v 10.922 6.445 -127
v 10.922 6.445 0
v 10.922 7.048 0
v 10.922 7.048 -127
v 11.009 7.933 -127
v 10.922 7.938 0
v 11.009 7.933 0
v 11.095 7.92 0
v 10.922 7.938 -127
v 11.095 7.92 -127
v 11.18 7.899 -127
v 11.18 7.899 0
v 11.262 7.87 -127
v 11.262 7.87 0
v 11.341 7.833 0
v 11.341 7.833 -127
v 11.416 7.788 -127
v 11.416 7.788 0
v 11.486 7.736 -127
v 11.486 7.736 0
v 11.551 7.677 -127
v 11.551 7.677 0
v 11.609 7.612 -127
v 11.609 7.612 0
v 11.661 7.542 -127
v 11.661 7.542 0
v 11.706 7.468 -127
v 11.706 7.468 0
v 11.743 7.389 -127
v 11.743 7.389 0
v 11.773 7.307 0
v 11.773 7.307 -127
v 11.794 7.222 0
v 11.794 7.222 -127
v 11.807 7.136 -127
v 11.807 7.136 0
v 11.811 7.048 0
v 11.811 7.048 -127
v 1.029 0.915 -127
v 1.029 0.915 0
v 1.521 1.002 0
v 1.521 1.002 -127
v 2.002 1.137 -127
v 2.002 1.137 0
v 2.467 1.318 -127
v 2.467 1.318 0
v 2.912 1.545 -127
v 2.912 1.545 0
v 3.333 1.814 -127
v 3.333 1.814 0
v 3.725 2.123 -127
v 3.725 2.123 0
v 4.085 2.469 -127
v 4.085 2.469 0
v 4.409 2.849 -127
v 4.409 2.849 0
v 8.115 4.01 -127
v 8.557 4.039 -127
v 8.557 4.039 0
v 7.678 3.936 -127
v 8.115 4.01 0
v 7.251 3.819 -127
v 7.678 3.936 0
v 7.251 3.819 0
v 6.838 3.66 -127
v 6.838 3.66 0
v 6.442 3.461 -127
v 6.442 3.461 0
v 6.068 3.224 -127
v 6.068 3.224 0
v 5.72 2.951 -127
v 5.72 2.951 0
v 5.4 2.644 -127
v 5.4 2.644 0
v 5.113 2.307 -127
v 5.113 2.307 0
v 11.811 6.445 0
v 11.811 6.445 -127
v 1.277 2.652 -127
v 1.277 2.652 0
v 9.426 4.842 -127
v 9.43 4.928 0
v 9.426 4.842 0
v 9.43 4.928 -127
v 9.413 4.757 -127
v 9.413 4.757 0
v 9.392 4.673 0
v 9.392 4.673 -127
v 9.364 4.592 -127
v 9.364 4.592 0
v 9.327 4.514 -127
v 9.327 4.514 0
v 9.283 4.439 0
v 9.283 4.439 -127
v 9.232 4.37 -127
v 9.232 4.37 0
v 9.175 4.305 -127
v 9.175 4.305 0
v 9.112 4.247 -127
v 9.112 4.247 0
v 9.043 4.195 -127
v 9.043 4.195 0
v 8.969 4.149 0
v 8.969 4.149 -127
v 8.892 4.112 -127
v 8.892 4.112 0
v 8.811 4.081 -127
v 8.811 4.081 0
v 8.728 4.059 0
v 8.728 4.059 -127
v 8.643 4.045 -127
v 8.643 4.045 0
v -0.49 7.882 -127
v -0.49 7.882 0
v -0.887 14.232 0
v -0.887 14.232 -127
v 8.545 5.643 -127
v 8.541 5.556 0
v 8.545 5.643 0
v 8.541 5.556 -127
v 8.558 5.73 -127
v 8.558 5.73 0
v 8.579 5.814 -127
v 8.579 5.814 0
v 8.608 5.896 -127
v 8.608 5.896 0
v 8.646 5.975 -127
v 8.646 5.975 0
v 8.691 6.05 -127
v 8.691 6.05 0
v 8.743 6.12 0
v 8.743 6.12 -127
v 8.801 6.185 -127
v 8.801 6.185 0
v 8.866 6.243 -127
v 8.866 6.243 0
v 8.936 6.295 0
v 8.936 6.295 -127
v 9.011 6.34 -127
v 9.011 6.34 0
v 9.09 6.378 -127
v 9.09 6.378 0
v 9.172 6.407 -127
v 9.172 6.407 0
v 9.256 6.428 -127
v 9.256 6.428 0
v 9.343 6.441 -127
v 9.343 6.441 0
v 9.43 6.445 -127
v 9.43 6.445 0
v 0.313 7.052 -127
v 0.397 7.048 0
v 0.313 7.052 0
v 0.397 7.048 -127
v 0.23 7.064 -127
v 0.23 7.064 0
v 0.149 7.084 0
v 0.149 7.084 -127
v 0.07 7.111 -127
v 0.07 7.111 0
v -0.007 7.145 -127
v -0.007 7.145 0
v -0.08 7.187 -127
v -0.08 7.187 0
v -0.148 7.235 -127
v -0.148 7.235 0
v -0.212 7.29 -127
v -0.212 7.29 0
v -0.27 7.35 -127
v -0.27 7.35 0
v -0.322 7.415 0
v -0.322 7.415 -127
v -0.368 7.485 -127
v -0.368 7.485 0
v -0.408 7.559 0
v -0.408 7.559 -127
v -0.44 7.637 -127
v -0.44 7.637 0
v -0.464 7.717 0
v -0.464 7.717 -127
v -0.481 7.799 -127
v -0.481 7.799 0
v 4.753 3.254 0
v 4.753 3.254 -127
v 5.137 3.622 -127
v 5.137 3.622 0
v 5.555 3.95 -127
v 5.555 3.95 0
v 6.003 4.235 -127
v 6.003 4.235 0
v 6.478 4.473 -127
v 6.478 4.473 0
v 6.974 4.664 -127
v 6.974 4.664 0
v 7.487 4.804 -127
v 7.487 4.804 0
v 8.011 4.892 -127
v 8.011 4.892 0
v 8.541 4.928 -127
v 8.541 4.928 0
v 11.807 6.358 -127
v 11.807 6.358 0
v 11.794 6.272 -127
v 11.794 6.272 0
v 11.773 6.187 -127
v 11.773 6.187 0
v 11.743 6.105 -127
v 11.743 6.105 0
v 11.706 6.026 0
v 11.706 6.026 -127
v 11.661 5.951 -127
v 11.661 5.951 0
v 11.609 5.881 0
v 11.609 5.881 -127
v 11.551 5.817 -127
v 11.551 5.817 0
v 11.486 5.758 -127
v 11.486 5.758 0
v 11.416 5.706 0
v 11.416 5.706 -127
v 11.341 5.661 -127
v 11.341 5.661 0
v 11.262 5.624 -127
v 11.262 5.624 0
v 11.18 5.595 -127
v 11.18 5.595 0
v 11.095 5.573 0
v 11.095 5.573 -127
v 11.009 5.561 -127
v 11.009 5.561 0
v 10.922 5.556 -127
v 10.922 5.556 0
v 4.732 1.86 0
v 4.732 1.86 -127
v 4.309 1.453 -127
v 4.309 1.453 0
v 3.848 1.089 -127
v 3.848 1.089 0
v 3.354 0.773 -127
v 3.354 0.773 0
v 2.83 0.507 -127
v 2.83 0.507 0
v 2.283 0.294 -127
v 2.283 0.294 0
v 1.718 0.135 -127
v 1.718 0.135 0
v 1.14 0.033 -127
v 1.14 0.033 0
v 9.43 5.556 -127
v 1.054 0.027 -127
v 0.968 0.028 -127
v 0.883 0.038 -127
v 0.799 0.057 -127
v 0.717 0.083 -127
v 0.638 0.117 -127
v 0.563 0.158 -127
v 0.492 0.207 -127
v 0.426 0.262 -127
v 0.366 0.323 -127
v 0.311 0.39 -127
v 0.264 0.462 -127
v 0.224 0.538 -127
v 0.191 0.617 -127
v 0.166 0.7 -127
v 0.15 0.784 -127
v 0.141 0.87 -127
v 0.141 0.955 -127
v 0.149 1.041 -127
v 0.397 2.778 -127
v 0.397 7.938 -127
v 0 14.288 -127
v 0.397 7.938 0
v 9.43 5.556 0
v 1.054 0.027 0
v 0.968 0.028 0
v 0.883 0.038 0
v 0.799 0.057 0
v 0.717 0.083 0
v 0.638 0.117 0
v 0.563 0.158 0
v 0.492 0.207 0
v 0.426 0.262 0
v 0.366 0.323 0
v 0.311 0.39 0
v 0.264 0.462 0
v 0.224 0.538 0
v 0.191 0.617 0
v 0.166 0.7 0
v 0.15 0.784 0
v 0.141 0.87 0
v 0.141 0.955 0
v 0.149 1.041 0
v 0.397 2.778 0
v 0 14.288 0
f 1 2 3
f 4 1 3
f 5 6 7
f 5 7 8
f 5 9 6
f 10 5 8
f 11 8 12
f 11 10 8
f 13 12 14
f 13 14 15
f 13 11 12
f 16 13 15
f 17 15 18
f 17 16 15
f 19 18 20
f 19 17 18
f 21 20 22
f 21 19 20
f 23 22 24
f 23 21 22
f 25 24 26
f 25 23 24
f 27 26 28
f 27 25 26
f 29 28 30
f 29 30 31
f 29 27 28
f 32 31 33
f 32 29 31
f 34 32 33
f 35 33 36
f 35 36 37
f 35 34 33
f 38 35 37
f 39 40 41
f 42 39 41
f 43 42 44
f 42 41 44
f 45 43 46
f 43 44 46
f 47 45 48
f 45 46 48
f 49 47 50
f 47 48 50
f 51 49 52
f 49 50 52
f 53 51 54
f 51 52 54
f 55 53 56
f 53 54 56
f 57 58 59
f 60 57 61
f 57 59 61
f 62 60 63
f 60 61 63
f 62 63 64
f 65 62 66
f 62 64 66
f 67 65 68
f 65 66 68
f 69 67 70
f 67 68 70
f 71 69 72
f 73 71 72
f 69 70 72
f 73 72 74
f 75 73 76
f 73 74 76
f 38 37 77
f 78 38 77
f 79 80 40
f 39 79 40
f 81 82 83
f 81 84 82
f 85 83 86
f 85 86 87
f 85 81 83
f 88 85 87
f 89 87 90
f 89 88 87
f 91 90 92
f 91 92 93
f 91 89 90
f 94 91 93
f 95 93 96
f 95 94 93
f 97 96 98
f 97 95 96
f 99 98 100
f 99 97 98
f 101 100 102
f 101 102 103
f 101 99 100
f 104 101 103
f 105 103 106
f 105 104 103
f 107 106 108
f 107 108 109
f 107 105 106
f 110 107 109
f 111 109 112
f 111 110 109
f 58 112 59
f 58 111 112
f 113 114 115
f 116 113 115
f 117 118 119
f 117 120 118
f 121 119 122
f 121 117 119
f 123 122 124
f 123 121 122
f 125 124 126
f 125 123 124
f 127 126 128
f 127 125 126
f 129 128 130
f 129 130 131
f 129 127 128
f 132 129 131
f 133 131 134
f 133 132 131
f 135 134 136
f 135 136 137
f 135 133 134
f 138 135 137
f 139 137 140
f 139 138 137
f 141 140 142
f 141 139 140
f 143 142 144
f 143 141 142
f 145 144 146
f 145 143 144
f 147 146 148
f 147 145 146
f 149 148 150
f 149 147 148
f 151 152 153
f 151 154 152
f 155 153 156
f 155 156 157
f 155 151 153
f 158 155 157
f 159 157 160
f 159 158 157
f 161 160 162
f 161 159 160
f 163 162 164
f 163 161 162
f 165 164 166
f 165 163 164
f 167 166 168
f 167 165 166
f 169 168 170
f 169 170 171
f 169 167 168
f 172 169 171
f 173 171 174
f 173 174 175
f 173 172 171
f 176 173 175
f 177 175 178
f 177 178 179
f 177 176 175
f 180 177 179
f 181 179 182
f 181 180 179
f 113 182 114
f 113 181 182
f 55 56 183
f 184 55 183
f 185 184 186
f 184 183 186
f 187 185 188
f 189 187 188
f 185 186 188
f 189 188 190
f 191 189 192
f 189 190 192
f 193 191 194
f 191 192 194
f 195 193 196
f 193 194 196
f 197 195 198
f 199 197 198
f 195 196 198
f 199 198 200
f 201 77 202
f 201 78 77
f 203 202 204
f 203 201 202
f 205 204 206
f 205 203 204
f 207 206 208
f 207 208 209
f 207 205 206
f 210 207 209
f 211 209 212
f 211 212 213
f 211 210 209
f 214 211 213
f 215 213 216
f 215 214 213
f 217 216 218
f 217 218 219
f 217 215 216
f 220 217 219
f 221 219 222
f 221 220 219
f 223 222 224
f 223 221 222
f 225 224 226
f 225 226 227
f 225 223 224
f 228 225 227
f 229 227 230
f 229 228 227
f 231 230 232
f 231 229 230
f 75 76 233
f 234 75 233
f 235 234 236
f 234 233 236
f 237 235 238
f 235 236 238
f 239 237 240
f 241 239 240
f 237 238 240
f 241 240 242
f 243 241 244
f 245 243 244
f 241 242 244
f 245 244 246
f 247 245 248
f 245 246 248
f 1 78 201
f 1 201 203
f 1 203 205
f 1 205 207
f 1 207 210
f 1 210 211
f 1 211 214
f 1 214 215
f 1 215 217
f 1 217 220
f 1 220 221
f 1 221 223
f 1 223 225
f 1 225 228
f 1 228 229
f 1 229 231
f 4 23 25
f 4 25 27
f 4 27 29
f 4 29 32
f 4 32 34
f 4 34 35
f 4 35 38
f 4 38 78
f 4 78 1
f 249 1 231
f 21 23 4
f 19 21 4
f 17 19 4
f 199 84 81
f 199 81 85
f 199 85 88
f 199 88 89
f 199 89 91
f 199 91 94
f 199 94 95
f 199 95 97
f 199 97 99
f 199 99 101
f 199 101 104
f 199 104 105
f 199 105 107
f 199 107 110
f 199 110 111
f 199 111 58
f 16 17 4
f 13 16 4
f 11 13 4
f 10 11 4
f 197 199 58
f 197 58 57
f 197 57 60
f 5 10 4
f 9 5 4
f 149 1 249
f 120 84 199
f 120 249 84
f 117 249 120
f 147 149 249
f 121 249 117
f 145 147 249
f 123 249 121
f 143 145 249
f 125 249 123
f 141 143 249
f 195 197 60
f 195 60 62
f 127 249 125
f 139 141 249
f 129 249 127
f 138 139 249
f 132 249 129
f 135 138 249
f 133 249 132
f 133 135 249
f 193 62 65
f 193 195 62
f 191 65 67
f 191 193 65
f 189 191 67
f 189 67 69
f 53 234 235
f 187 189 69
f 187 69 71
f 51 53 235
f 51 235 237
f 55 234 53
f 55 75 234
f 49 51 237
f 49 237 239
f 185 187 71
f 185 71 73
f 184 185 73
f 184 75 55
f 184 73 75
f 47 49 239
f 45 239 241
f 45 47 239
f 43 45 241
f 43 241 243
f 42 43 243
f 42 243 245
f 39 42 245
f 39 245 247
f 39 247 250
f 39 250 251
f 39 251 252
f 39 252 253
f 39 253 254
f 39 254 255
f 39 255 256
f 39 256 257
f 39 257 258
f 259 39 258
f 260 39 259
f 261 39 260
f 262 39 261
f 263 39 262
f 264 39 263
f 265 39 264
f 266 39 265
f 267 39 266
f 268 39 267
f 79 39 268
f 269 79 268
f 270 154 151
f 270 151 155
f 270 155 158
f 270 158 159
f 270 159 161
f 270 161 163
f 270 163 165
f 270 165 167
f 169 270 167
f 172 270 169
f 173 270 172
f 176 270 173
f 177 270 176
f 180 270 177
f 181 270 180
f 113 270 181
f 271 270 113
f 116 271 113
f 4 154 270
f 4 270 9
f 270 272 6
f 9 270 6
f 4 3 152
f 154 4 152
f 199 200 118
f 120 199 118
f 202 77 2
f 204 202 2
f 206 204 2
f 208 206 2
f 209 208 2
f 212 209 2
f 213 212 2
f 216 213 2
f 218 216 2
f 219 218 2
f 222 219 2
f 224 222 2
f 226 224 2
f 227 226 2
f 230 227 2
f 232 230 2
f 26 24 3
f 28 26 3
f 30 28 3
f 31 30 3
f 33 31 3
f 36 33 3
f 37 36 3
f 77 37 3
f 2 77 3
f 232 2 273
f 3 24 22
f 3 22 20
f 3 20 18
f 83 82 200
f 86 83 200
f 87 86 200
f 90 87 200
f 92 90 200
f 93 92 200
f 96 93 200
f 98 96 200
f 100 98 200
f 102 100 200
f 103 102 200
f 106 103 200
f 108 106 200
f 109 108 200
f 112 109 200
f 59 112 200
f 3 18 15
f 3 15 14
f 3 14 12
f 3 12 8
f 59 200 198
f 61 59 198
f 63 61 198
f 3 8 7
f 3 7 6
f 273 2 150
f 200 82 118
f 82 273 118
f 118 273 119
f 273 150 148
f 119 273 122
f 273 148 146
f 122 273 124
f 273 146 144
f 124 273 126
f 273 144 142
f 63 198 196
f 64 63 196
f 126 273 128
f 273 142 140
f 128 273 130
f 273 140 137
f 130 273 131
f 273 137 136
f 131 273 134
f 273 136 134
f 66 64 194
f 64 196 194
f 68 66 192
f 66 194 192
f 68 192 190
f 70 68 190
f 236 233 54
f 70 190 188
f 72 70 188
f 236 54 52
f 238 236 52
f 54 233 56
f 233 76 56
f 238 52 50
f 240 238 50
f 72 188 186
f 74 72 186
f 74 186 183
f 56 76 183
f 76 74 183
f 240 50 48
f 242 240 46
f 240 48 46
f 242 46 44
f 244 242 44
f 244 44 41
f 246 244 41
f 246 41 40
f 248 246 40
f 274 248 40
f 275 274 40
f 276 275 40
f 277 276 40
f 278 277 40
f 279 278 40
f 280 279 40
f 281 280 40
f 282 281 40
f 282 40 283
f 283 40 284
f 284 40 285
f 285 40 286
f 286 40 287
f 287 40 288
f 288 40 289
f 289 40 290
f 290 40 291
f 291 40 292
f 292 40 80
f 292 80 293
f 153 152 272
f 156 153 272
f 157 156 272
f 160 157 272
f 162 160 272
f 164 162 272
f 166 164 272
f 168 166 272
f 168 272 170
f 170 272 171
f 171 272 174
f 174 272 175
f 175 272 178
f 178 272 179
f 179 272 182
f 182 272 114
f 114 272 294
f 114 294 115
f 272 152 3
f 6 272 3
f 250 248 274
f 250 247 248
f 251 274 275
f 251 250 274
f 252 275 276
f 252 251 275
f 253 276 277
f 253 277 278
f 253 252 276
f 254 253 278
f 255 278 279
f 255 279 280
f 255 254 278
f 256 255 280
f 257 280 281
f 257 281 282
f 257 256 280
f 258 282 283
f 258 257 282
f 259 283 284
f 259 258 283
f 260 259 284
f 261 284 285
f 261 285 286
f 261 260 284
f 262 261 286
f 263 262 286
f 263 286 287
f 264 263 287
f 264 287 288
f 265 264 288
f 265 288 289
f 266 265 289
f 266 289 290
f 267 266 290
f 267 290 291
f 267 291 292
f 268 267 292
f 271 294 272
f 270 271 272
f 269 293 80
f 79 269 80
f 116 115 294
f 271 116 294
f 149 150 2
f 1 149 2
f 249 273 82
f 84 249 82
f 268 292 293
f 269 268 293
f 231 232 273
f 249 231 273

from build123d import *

# Parameters (mm, degrees)
EXTRUDE_THIN1_DEPTH = 127
FILLET1_R           = 0.889


with BuildPart() as part:
    # Sketch1 → Extrude-Thin1 (new body)
    with BuildSketch(Plane.XY):
        with BuildLine():
            Line((0, 14.2875), (0.396875, 7.9375))
            Line((0.396875, 7.9375), (11.811, 7.9375))
            Line((11.811, 7.9375), (11.811, 5.55625))
            Line((11.811, 5.55625), (9.42975, 5.55625))
            Line((9.42975, 5.55625), (9.42975, 3.96875))
            ThreePointArc((9.42975, 3.96875), (7.038283045, 3.743245435), (5.112942469, 2.306920202))
            ThreePointArc((5.112942469, 2.306920202), (2.845206289, 0.513522178), (0, 0))
            Line((0, 0), (0.396875, 2.778125))
            Line((0.396875, 2.778125), (1.2769401, 2.652401414))
            Line((1.2769401, 2.652401414), (1.028787976, 0.915336544))
            ThreePointArc((1.028787976, 0.915336544), (2.912071238, 1.54452561), (4.408676393, 2.849442363))
            ThreePointArc((4.408676393, 2.849442363), (6.237754348, 4.359868554), (8.54075, 4.928308939))
            Line((8.54075, 4.928308939), (8.54075, 6.44525))
            Line((8.54075, 6.44525), (10.922, 6.44525))
            Line((10.922, 6.44525), (10.922, 7.0485))
            Line((10.922, 7.0485), (-0.438297136, 7.0485))
            Line((-0.438297136, 7.0485), (-0.887268742, 14.232045704))
            Line((-0.887268742, 14.232045704), (0, 14.2875))
        make_face()
    extrude(amount=-EXTRUDE_THIN1_DEPTH)

    # Fillet1
    fillet1_edges = [part.edges().sort_by_distance(p)[0] for p in [
        (8.54075, 6.44525, -63.5),
        (-0.438297136, 7.0485, -63.5),
        (11.811, 7.9375, -63.5),
        (11.811, 5.55625, -63.5),
        (9.42975, 3.96875, -63.5),
        (0, 0, -63.5),
    ]]
    fillet(fillet1_edges, radius=FILLET1_R)


solid = part.part
